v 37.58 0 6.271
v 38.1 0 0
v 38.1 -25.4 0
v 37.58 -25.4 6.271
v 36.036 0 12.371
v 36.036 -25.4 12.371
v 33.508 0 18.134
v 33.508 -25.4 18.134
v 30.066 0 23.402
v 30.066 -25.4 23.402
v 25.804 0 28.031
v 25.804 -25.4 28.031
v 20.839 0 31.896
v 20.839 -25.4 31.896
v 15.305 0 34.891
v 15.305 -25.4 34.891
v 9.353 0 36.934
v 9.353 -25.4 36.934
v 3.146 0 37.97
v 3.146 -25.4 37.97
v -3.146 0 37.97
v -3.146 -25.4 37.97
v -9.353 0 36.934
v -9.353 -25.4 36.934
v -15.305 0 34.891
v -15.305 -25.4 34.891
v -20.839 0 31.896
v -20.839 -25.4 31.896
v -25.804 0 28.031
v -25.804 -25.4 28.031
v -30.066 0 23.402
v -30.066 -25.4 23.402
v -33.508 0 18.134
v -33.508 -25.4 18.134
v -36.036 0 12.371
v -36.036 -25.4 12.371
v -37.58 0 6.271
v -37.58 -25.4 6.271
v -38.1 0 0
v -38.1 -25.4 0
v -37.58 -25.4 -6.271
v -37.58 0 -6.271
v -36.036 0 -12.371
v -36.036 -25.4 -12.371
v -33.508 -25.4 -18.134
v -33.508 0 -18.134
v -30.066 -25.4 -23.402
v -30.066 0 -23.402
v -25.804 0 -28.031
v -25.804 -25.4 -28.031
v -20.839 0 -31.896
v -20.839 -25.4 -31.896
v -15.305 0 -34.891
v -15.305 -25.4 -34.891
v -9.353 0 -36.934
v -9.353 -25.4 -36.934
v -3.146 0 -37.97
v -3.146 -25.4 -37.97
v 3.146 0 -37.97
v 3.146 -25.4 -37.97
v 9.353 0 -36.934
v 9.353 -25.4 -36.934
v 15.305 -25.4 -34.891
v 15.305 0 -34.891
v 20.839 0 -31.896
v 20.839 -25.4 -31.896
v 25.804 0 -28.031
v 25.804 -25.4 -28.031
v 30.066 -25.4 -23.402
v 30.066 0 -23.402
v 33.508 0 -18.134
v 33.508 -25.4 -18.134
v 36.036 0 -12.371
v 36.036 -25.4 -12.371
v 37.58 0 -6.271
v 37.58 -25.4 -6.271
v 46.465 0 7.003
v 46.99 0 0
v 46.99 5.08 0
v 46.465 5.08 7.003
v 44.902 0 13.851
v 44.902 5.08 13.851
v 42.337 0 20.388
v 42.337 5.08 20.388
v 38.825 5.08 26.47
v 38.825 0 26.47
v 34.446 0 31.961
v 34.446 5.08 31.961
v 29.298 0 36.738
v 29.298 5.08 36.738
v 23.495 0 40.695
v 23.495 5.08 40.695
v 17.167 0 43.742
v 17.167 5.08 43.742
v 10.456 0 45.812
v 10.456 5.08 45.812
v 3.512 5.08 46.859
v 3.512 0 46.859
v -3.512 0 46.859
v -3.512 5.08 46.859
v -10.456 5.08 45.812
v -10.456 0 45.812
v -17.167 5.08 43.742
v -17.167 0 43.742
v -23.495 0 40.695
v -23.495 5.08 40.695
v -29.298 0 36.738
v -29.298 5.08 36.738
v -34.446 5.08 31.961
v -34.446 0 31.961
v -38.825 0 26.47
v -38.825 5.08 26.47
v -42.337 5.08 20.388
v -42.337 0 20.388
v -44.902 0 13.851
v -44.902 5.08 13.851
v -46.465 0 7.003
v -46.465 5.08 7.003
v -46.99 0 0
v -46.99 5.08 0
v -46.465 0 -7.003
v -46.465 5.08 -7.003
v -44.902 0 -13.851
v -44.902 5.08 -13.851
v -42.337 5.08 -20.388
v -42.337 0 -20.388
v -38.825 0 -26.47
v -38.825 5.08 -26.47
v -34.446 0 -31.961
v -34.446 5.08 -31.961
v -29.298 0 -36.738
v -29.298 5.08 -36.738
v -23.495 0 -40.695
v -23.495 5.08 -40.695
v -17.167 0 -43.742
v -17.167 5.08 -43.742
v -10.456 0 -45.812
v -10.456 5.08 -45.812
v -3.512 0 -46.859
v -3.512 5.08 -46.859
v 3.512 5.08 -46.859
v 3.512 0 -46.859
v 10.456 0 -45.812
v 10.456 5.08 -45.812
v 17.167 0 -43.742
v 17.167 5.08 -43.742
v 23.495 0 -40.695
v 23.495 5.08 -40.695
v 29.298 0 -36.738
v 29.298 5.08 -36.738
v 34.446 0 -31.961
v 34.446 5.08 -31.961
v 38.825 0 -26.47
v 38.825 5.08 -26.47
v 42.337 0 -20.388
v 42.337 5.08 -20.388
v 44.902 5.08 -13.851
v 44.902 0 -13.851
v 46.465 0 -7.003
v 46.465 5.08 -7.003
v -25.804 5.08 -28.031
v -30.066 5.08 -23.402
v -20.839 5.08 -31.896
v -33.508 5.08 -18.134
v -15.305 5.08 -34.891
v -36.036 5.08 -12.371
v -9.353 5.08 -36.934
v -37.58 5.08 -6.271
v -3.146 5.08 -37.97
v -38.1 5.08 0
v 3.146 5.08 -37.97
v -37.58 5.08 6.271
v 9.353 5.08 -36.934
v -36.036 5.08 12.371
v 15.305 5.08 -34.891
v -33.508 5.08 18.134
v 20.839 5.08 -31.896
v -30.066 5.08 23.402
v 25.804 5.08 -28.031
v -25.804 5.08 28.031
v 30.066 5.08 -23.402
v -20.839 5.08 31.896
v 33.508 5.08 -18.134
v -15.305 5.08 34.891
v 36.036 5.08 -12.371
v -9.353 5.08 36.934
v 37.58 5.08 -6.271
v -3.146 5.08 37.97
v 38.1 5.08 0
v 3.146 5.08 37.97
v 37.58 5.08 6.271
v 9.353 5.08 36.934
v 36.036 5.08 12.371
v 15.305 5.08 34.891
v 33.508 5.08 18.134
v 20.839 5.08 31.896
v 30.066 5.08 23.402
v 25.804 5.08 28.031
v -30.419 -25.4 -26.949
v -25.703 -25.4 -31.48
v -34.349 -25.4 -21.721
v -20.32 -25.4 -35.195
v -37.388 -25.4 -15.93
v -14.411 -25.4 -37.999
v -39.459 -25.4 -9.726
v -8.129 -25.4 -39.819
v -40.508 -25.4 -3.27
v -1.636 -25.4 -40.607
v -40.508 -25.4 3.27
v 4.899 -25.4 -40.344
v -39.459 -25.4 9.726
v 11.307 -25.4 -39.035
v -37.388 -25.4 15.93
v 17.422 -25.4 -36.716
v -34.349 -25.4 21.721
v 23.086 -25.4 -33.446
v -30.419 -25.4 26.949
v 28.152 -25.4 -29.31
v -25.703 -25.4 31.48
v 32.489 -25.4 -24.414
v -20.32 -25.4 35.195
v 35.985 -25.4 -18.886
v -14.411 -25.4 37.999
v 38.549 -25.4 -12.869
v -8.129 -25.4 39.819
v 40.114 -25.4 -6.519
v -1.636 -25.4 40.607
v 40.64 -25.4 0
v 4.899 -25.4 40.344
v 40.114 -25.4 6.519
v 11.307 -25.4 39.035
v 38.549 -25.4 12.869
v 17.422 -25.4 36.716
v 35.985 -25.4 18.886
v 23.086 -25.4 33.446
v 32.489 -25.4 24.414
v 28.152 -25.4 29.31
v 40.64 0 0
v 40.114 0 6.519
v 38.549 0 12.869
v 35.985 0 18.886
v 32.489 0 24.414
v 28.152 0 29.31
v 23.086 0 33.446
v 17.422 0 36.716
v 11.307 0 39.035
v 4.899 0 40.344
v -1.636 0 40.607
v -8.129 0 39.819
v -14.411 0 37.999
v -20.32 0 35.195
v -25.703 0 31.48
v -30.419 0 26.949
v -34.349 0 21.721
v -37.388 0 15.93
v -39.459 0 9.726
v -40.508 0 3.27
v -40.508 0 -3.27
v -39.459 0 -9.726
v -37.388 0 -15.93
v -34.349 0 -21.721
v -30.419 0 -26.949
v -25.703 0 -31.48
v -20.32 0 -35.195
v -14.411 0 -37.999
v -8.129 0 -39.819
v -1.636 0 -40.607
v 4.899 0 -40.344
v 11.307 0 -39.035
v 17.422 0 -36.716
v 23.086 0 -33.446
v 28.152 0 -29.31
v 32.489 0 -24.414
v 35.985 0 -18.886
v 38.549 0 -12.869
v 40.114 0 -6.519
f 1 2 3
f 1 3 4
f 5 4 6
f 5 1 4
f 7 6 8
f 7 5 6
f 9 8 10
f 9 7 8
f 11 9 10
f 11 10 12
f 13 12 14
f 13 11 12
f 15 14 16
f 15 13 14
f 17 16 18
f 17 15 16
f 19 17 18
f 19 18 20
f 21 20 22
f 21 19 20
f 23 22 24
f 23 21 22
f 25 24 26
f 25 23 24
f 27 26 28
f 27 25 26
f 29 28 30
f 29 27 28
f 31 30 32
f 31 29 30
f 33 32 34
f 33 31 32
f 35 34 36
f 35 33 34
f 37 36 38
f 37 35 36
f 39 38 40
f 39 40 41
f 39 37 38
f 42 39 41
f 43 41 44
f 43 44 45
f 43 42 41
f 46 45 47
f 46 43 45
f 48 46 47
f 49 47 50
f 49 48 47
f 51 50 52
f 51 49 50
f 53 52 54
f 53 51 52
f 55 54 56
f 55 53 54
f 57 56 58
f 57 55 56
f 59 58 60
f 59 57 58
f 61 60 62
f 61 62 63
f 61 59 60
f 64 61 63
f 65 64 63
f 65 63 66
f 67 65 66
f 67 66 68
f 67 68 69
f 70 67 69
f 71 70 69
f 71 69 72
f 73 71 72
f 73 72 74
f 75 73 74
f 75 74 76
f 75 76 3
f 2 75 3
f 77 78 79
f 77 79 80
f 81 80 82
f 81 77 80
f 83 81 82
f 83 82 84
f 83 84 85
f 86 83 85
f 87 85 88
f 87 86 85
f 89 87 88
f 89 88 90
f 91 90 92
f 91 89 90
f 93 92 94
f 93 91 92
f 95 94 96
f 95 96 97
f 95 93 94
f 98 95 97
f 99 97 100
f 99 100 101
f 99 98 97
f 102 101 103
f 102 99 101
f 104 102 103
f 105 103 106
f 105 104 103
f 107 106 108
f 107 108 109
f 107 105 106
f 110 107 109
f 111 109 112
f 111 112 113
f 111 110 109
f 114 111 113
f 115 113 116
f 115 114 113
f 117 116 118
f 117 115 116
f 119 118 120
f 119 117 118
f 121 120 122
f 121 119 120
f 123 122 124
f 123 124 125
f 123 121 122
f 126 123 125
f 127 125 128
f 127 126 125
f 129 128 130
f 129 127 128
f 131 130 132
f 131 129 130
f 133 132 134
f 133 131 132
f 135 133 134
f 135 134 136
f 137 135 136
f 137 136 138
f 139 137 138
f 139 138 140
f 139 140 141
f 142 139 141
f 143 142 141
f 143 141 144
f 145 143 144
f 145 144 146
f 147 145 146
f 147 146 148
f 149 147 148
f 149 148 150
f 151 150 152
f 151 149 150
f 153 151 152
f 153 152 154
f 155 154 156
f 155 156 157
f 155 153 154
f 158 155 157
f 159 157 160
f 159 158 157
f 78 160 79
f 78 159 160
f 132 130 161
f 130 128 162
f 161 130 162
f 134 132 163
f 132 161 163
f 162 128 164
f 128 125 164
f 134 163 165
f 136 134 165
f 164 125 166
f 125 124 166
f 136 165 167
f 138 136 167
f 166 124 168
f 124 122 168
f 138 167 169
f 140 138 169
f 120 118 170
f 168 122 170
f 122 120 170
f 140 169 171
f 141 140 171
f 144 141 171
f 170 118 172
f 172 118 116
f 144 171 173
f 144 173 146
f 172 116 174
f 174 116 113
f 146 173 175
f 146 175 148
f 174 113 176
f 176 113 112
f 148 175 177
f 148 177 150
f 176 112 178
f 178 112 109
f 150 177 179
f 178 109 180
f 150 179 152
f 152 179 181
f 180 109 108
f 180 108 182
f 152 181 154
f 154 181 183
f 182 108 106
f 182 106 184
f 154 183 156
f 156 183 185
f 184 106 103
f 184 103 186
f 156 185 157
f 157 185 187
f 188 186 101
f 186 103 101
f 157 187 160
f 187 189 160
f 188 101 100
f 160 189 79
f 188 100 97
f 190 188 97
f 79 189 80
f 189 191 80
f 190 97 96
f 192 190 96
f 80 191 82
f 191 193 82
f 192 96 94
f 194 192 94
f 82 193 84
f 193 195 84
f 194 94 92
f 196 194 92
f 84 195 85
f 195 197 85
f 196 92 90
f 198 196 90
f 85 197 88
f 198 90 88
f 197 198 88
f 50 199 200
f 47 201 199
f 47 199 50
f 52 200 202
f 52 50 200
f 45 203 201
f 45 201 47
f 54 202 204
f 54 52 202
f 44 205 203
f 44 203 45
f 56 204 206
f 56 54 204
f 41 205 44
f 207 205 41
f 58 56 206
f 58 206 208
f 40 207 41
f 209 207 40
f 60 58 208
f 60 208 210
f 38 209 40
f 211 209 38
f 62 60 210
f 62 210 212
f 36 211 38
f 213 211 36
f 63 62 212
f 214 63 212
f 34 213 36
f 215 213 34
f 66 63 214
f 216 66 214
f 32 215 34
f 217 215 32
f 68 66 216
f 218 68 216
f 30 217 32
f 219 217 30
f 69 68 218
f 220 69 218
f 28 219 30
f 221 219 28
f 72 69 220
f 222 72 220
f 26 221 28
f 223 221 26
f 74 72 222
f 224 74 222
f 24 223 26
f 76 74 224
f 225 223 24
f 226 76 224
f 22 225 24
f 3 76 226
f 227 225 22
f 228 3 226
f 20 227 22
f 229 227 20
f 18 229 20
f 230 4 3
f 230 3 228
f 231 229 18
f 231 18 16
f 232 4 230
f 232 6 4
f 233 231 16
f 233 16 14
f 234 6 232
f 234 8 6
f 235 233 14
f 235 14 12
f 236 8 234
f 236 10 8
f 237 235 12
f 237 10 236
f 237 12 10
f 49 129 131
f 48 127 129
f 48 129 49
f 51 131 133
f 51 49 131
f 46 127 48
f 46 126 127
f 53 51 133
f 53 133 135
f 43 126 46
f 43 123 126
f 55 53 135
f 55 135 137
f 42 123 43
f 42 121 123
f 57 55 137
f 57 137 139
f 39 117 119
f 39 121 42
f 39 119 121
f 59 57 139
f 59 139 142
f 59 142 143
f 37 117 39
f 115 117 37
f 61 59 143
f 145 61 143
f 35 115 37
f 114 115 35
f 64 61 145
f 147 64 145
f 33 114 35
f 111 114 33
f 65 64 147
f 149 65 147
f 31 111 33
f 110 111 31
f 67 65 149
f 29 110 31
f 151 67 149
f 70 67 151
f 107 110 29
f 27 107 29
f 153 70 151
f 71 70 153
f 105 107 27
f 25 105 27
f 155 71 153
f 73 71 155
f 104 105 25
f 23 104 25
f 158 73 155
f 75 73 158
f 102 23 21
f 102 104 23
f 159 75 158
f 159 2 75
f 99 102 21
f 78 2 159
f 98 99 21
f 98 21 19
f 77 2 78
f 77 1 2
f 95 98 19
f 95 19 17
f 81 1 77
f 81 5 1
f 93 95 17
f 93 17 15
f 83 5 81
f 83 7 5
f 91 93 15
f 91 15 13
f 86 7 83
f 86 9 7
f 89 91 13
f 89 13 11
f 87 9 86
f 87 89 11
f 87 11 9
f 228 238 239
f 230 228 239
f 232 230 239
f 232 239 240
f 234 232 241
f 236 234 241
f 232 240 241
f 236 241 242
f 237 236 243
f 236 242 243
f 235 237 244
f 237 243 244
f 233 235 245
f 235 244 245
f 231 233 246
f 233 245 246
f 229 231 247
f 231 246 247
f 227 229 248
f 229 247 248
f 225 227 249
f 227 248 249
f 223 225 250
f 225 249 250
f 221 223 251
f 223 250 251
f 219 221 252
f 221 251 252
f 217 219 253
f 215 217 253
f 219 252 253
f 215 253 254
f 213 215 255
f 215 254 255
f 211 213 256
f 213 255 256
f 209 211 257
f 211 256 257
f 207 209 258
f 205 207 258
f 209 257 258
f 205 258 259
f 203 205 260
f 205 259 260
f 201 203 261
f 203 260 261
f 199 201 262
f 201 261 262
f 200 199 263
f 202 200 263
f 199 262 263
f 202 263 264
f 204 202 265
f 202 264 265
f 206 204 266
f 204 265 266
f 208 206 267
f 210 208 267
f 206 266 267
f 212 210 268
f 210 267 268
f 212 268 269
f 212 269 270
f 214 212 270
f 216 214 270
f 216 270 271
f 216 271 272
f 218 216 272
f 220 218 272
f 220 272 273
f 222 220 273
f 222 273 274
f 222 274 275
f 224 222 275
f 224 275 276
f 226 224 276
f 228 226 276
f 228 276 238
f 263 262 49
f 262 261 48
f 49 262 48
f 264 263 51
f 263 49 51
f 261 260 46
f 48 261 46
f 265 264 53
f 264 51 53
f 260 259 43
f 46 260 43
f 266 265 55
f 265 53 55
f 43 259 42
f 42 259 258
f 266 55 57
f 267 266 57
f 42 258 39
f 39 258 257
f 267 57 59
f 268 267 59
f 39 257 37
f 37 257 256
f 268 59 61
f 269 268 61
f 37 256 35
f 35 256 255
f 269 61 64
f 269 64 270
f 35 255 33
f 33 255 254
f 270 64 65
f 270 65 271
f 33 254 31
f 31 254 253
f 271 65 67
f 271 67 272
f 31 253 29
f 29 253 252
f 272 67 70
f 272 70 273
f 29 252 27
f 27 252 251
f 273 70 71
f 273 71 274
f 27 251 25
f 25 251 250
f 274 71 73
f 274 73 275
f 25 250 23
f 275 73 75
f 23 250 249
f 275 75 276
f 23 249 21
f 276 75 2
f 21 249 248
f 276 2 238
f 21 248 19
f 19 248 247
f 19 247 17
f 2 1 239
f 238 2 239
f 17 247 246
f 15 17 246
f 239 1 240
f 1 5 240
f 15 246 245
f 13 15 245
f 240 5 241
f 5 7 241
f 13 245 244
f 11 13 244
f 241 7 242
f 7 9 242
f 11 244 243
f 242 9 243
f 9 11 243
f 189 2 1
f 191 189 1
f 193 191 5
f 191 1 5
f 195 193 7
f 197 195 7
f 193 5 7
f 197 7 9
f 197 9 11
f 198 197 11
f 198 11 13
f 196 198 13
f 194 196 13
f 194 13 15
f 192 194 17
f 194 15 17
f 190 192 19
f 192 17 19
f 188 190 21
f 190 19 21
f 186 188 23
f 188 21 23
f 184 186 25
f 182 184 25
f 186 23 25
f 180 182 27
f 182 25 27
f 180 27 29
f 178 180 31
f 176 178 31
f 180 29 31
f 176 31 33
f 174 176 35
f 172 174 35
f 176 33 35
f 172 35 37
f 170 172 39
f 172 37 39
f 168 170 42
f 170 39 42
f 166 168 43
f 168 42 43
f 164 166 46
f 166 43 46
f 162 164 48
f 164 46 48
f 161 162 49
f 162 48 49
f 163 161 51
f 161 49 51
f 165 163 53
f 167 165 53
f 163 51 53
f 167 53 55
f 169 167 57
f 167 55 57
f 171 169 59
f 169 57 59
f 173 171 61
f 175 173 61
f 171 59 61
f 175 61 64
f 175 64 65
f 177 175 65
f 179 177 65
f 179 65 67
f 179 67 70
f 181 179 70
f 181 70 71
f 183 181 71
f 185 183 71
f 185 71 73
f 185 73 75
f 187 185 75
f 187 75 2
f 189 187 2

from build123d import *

# Parameters (mm, degrees)
F0_R     = 40.64
F0_R_2   = 38.1
F1_DEPTH = 25.4
F0_R_3   = 46.99
F2_DEPTH = 5.08


with BuildPart() as f1:
    # F0 (on Front) → F1 (new body)
    with BuildSketch(Plane.XZ):
        Circle(F0_R)
        Circle(F0_R_2, mode=Mode.SUBTRACT)
    extrude(amount=F1_DEPTH)


with BuildPart() as f2:
    # F0 (on Front) → F2 (new body)
    with BuildSketch(Plane.XZ):
        Circle(F0_R_3)
        Circle(F0_R, mode=Mode.SUBTRACT)
        Circle(F0_R)
        Circle(F0_R_2, mode=Mode.SUBTRACT)
    extrude(amount=-F2_DEPTH)


solid = Compound([f1.part, f2.part])
